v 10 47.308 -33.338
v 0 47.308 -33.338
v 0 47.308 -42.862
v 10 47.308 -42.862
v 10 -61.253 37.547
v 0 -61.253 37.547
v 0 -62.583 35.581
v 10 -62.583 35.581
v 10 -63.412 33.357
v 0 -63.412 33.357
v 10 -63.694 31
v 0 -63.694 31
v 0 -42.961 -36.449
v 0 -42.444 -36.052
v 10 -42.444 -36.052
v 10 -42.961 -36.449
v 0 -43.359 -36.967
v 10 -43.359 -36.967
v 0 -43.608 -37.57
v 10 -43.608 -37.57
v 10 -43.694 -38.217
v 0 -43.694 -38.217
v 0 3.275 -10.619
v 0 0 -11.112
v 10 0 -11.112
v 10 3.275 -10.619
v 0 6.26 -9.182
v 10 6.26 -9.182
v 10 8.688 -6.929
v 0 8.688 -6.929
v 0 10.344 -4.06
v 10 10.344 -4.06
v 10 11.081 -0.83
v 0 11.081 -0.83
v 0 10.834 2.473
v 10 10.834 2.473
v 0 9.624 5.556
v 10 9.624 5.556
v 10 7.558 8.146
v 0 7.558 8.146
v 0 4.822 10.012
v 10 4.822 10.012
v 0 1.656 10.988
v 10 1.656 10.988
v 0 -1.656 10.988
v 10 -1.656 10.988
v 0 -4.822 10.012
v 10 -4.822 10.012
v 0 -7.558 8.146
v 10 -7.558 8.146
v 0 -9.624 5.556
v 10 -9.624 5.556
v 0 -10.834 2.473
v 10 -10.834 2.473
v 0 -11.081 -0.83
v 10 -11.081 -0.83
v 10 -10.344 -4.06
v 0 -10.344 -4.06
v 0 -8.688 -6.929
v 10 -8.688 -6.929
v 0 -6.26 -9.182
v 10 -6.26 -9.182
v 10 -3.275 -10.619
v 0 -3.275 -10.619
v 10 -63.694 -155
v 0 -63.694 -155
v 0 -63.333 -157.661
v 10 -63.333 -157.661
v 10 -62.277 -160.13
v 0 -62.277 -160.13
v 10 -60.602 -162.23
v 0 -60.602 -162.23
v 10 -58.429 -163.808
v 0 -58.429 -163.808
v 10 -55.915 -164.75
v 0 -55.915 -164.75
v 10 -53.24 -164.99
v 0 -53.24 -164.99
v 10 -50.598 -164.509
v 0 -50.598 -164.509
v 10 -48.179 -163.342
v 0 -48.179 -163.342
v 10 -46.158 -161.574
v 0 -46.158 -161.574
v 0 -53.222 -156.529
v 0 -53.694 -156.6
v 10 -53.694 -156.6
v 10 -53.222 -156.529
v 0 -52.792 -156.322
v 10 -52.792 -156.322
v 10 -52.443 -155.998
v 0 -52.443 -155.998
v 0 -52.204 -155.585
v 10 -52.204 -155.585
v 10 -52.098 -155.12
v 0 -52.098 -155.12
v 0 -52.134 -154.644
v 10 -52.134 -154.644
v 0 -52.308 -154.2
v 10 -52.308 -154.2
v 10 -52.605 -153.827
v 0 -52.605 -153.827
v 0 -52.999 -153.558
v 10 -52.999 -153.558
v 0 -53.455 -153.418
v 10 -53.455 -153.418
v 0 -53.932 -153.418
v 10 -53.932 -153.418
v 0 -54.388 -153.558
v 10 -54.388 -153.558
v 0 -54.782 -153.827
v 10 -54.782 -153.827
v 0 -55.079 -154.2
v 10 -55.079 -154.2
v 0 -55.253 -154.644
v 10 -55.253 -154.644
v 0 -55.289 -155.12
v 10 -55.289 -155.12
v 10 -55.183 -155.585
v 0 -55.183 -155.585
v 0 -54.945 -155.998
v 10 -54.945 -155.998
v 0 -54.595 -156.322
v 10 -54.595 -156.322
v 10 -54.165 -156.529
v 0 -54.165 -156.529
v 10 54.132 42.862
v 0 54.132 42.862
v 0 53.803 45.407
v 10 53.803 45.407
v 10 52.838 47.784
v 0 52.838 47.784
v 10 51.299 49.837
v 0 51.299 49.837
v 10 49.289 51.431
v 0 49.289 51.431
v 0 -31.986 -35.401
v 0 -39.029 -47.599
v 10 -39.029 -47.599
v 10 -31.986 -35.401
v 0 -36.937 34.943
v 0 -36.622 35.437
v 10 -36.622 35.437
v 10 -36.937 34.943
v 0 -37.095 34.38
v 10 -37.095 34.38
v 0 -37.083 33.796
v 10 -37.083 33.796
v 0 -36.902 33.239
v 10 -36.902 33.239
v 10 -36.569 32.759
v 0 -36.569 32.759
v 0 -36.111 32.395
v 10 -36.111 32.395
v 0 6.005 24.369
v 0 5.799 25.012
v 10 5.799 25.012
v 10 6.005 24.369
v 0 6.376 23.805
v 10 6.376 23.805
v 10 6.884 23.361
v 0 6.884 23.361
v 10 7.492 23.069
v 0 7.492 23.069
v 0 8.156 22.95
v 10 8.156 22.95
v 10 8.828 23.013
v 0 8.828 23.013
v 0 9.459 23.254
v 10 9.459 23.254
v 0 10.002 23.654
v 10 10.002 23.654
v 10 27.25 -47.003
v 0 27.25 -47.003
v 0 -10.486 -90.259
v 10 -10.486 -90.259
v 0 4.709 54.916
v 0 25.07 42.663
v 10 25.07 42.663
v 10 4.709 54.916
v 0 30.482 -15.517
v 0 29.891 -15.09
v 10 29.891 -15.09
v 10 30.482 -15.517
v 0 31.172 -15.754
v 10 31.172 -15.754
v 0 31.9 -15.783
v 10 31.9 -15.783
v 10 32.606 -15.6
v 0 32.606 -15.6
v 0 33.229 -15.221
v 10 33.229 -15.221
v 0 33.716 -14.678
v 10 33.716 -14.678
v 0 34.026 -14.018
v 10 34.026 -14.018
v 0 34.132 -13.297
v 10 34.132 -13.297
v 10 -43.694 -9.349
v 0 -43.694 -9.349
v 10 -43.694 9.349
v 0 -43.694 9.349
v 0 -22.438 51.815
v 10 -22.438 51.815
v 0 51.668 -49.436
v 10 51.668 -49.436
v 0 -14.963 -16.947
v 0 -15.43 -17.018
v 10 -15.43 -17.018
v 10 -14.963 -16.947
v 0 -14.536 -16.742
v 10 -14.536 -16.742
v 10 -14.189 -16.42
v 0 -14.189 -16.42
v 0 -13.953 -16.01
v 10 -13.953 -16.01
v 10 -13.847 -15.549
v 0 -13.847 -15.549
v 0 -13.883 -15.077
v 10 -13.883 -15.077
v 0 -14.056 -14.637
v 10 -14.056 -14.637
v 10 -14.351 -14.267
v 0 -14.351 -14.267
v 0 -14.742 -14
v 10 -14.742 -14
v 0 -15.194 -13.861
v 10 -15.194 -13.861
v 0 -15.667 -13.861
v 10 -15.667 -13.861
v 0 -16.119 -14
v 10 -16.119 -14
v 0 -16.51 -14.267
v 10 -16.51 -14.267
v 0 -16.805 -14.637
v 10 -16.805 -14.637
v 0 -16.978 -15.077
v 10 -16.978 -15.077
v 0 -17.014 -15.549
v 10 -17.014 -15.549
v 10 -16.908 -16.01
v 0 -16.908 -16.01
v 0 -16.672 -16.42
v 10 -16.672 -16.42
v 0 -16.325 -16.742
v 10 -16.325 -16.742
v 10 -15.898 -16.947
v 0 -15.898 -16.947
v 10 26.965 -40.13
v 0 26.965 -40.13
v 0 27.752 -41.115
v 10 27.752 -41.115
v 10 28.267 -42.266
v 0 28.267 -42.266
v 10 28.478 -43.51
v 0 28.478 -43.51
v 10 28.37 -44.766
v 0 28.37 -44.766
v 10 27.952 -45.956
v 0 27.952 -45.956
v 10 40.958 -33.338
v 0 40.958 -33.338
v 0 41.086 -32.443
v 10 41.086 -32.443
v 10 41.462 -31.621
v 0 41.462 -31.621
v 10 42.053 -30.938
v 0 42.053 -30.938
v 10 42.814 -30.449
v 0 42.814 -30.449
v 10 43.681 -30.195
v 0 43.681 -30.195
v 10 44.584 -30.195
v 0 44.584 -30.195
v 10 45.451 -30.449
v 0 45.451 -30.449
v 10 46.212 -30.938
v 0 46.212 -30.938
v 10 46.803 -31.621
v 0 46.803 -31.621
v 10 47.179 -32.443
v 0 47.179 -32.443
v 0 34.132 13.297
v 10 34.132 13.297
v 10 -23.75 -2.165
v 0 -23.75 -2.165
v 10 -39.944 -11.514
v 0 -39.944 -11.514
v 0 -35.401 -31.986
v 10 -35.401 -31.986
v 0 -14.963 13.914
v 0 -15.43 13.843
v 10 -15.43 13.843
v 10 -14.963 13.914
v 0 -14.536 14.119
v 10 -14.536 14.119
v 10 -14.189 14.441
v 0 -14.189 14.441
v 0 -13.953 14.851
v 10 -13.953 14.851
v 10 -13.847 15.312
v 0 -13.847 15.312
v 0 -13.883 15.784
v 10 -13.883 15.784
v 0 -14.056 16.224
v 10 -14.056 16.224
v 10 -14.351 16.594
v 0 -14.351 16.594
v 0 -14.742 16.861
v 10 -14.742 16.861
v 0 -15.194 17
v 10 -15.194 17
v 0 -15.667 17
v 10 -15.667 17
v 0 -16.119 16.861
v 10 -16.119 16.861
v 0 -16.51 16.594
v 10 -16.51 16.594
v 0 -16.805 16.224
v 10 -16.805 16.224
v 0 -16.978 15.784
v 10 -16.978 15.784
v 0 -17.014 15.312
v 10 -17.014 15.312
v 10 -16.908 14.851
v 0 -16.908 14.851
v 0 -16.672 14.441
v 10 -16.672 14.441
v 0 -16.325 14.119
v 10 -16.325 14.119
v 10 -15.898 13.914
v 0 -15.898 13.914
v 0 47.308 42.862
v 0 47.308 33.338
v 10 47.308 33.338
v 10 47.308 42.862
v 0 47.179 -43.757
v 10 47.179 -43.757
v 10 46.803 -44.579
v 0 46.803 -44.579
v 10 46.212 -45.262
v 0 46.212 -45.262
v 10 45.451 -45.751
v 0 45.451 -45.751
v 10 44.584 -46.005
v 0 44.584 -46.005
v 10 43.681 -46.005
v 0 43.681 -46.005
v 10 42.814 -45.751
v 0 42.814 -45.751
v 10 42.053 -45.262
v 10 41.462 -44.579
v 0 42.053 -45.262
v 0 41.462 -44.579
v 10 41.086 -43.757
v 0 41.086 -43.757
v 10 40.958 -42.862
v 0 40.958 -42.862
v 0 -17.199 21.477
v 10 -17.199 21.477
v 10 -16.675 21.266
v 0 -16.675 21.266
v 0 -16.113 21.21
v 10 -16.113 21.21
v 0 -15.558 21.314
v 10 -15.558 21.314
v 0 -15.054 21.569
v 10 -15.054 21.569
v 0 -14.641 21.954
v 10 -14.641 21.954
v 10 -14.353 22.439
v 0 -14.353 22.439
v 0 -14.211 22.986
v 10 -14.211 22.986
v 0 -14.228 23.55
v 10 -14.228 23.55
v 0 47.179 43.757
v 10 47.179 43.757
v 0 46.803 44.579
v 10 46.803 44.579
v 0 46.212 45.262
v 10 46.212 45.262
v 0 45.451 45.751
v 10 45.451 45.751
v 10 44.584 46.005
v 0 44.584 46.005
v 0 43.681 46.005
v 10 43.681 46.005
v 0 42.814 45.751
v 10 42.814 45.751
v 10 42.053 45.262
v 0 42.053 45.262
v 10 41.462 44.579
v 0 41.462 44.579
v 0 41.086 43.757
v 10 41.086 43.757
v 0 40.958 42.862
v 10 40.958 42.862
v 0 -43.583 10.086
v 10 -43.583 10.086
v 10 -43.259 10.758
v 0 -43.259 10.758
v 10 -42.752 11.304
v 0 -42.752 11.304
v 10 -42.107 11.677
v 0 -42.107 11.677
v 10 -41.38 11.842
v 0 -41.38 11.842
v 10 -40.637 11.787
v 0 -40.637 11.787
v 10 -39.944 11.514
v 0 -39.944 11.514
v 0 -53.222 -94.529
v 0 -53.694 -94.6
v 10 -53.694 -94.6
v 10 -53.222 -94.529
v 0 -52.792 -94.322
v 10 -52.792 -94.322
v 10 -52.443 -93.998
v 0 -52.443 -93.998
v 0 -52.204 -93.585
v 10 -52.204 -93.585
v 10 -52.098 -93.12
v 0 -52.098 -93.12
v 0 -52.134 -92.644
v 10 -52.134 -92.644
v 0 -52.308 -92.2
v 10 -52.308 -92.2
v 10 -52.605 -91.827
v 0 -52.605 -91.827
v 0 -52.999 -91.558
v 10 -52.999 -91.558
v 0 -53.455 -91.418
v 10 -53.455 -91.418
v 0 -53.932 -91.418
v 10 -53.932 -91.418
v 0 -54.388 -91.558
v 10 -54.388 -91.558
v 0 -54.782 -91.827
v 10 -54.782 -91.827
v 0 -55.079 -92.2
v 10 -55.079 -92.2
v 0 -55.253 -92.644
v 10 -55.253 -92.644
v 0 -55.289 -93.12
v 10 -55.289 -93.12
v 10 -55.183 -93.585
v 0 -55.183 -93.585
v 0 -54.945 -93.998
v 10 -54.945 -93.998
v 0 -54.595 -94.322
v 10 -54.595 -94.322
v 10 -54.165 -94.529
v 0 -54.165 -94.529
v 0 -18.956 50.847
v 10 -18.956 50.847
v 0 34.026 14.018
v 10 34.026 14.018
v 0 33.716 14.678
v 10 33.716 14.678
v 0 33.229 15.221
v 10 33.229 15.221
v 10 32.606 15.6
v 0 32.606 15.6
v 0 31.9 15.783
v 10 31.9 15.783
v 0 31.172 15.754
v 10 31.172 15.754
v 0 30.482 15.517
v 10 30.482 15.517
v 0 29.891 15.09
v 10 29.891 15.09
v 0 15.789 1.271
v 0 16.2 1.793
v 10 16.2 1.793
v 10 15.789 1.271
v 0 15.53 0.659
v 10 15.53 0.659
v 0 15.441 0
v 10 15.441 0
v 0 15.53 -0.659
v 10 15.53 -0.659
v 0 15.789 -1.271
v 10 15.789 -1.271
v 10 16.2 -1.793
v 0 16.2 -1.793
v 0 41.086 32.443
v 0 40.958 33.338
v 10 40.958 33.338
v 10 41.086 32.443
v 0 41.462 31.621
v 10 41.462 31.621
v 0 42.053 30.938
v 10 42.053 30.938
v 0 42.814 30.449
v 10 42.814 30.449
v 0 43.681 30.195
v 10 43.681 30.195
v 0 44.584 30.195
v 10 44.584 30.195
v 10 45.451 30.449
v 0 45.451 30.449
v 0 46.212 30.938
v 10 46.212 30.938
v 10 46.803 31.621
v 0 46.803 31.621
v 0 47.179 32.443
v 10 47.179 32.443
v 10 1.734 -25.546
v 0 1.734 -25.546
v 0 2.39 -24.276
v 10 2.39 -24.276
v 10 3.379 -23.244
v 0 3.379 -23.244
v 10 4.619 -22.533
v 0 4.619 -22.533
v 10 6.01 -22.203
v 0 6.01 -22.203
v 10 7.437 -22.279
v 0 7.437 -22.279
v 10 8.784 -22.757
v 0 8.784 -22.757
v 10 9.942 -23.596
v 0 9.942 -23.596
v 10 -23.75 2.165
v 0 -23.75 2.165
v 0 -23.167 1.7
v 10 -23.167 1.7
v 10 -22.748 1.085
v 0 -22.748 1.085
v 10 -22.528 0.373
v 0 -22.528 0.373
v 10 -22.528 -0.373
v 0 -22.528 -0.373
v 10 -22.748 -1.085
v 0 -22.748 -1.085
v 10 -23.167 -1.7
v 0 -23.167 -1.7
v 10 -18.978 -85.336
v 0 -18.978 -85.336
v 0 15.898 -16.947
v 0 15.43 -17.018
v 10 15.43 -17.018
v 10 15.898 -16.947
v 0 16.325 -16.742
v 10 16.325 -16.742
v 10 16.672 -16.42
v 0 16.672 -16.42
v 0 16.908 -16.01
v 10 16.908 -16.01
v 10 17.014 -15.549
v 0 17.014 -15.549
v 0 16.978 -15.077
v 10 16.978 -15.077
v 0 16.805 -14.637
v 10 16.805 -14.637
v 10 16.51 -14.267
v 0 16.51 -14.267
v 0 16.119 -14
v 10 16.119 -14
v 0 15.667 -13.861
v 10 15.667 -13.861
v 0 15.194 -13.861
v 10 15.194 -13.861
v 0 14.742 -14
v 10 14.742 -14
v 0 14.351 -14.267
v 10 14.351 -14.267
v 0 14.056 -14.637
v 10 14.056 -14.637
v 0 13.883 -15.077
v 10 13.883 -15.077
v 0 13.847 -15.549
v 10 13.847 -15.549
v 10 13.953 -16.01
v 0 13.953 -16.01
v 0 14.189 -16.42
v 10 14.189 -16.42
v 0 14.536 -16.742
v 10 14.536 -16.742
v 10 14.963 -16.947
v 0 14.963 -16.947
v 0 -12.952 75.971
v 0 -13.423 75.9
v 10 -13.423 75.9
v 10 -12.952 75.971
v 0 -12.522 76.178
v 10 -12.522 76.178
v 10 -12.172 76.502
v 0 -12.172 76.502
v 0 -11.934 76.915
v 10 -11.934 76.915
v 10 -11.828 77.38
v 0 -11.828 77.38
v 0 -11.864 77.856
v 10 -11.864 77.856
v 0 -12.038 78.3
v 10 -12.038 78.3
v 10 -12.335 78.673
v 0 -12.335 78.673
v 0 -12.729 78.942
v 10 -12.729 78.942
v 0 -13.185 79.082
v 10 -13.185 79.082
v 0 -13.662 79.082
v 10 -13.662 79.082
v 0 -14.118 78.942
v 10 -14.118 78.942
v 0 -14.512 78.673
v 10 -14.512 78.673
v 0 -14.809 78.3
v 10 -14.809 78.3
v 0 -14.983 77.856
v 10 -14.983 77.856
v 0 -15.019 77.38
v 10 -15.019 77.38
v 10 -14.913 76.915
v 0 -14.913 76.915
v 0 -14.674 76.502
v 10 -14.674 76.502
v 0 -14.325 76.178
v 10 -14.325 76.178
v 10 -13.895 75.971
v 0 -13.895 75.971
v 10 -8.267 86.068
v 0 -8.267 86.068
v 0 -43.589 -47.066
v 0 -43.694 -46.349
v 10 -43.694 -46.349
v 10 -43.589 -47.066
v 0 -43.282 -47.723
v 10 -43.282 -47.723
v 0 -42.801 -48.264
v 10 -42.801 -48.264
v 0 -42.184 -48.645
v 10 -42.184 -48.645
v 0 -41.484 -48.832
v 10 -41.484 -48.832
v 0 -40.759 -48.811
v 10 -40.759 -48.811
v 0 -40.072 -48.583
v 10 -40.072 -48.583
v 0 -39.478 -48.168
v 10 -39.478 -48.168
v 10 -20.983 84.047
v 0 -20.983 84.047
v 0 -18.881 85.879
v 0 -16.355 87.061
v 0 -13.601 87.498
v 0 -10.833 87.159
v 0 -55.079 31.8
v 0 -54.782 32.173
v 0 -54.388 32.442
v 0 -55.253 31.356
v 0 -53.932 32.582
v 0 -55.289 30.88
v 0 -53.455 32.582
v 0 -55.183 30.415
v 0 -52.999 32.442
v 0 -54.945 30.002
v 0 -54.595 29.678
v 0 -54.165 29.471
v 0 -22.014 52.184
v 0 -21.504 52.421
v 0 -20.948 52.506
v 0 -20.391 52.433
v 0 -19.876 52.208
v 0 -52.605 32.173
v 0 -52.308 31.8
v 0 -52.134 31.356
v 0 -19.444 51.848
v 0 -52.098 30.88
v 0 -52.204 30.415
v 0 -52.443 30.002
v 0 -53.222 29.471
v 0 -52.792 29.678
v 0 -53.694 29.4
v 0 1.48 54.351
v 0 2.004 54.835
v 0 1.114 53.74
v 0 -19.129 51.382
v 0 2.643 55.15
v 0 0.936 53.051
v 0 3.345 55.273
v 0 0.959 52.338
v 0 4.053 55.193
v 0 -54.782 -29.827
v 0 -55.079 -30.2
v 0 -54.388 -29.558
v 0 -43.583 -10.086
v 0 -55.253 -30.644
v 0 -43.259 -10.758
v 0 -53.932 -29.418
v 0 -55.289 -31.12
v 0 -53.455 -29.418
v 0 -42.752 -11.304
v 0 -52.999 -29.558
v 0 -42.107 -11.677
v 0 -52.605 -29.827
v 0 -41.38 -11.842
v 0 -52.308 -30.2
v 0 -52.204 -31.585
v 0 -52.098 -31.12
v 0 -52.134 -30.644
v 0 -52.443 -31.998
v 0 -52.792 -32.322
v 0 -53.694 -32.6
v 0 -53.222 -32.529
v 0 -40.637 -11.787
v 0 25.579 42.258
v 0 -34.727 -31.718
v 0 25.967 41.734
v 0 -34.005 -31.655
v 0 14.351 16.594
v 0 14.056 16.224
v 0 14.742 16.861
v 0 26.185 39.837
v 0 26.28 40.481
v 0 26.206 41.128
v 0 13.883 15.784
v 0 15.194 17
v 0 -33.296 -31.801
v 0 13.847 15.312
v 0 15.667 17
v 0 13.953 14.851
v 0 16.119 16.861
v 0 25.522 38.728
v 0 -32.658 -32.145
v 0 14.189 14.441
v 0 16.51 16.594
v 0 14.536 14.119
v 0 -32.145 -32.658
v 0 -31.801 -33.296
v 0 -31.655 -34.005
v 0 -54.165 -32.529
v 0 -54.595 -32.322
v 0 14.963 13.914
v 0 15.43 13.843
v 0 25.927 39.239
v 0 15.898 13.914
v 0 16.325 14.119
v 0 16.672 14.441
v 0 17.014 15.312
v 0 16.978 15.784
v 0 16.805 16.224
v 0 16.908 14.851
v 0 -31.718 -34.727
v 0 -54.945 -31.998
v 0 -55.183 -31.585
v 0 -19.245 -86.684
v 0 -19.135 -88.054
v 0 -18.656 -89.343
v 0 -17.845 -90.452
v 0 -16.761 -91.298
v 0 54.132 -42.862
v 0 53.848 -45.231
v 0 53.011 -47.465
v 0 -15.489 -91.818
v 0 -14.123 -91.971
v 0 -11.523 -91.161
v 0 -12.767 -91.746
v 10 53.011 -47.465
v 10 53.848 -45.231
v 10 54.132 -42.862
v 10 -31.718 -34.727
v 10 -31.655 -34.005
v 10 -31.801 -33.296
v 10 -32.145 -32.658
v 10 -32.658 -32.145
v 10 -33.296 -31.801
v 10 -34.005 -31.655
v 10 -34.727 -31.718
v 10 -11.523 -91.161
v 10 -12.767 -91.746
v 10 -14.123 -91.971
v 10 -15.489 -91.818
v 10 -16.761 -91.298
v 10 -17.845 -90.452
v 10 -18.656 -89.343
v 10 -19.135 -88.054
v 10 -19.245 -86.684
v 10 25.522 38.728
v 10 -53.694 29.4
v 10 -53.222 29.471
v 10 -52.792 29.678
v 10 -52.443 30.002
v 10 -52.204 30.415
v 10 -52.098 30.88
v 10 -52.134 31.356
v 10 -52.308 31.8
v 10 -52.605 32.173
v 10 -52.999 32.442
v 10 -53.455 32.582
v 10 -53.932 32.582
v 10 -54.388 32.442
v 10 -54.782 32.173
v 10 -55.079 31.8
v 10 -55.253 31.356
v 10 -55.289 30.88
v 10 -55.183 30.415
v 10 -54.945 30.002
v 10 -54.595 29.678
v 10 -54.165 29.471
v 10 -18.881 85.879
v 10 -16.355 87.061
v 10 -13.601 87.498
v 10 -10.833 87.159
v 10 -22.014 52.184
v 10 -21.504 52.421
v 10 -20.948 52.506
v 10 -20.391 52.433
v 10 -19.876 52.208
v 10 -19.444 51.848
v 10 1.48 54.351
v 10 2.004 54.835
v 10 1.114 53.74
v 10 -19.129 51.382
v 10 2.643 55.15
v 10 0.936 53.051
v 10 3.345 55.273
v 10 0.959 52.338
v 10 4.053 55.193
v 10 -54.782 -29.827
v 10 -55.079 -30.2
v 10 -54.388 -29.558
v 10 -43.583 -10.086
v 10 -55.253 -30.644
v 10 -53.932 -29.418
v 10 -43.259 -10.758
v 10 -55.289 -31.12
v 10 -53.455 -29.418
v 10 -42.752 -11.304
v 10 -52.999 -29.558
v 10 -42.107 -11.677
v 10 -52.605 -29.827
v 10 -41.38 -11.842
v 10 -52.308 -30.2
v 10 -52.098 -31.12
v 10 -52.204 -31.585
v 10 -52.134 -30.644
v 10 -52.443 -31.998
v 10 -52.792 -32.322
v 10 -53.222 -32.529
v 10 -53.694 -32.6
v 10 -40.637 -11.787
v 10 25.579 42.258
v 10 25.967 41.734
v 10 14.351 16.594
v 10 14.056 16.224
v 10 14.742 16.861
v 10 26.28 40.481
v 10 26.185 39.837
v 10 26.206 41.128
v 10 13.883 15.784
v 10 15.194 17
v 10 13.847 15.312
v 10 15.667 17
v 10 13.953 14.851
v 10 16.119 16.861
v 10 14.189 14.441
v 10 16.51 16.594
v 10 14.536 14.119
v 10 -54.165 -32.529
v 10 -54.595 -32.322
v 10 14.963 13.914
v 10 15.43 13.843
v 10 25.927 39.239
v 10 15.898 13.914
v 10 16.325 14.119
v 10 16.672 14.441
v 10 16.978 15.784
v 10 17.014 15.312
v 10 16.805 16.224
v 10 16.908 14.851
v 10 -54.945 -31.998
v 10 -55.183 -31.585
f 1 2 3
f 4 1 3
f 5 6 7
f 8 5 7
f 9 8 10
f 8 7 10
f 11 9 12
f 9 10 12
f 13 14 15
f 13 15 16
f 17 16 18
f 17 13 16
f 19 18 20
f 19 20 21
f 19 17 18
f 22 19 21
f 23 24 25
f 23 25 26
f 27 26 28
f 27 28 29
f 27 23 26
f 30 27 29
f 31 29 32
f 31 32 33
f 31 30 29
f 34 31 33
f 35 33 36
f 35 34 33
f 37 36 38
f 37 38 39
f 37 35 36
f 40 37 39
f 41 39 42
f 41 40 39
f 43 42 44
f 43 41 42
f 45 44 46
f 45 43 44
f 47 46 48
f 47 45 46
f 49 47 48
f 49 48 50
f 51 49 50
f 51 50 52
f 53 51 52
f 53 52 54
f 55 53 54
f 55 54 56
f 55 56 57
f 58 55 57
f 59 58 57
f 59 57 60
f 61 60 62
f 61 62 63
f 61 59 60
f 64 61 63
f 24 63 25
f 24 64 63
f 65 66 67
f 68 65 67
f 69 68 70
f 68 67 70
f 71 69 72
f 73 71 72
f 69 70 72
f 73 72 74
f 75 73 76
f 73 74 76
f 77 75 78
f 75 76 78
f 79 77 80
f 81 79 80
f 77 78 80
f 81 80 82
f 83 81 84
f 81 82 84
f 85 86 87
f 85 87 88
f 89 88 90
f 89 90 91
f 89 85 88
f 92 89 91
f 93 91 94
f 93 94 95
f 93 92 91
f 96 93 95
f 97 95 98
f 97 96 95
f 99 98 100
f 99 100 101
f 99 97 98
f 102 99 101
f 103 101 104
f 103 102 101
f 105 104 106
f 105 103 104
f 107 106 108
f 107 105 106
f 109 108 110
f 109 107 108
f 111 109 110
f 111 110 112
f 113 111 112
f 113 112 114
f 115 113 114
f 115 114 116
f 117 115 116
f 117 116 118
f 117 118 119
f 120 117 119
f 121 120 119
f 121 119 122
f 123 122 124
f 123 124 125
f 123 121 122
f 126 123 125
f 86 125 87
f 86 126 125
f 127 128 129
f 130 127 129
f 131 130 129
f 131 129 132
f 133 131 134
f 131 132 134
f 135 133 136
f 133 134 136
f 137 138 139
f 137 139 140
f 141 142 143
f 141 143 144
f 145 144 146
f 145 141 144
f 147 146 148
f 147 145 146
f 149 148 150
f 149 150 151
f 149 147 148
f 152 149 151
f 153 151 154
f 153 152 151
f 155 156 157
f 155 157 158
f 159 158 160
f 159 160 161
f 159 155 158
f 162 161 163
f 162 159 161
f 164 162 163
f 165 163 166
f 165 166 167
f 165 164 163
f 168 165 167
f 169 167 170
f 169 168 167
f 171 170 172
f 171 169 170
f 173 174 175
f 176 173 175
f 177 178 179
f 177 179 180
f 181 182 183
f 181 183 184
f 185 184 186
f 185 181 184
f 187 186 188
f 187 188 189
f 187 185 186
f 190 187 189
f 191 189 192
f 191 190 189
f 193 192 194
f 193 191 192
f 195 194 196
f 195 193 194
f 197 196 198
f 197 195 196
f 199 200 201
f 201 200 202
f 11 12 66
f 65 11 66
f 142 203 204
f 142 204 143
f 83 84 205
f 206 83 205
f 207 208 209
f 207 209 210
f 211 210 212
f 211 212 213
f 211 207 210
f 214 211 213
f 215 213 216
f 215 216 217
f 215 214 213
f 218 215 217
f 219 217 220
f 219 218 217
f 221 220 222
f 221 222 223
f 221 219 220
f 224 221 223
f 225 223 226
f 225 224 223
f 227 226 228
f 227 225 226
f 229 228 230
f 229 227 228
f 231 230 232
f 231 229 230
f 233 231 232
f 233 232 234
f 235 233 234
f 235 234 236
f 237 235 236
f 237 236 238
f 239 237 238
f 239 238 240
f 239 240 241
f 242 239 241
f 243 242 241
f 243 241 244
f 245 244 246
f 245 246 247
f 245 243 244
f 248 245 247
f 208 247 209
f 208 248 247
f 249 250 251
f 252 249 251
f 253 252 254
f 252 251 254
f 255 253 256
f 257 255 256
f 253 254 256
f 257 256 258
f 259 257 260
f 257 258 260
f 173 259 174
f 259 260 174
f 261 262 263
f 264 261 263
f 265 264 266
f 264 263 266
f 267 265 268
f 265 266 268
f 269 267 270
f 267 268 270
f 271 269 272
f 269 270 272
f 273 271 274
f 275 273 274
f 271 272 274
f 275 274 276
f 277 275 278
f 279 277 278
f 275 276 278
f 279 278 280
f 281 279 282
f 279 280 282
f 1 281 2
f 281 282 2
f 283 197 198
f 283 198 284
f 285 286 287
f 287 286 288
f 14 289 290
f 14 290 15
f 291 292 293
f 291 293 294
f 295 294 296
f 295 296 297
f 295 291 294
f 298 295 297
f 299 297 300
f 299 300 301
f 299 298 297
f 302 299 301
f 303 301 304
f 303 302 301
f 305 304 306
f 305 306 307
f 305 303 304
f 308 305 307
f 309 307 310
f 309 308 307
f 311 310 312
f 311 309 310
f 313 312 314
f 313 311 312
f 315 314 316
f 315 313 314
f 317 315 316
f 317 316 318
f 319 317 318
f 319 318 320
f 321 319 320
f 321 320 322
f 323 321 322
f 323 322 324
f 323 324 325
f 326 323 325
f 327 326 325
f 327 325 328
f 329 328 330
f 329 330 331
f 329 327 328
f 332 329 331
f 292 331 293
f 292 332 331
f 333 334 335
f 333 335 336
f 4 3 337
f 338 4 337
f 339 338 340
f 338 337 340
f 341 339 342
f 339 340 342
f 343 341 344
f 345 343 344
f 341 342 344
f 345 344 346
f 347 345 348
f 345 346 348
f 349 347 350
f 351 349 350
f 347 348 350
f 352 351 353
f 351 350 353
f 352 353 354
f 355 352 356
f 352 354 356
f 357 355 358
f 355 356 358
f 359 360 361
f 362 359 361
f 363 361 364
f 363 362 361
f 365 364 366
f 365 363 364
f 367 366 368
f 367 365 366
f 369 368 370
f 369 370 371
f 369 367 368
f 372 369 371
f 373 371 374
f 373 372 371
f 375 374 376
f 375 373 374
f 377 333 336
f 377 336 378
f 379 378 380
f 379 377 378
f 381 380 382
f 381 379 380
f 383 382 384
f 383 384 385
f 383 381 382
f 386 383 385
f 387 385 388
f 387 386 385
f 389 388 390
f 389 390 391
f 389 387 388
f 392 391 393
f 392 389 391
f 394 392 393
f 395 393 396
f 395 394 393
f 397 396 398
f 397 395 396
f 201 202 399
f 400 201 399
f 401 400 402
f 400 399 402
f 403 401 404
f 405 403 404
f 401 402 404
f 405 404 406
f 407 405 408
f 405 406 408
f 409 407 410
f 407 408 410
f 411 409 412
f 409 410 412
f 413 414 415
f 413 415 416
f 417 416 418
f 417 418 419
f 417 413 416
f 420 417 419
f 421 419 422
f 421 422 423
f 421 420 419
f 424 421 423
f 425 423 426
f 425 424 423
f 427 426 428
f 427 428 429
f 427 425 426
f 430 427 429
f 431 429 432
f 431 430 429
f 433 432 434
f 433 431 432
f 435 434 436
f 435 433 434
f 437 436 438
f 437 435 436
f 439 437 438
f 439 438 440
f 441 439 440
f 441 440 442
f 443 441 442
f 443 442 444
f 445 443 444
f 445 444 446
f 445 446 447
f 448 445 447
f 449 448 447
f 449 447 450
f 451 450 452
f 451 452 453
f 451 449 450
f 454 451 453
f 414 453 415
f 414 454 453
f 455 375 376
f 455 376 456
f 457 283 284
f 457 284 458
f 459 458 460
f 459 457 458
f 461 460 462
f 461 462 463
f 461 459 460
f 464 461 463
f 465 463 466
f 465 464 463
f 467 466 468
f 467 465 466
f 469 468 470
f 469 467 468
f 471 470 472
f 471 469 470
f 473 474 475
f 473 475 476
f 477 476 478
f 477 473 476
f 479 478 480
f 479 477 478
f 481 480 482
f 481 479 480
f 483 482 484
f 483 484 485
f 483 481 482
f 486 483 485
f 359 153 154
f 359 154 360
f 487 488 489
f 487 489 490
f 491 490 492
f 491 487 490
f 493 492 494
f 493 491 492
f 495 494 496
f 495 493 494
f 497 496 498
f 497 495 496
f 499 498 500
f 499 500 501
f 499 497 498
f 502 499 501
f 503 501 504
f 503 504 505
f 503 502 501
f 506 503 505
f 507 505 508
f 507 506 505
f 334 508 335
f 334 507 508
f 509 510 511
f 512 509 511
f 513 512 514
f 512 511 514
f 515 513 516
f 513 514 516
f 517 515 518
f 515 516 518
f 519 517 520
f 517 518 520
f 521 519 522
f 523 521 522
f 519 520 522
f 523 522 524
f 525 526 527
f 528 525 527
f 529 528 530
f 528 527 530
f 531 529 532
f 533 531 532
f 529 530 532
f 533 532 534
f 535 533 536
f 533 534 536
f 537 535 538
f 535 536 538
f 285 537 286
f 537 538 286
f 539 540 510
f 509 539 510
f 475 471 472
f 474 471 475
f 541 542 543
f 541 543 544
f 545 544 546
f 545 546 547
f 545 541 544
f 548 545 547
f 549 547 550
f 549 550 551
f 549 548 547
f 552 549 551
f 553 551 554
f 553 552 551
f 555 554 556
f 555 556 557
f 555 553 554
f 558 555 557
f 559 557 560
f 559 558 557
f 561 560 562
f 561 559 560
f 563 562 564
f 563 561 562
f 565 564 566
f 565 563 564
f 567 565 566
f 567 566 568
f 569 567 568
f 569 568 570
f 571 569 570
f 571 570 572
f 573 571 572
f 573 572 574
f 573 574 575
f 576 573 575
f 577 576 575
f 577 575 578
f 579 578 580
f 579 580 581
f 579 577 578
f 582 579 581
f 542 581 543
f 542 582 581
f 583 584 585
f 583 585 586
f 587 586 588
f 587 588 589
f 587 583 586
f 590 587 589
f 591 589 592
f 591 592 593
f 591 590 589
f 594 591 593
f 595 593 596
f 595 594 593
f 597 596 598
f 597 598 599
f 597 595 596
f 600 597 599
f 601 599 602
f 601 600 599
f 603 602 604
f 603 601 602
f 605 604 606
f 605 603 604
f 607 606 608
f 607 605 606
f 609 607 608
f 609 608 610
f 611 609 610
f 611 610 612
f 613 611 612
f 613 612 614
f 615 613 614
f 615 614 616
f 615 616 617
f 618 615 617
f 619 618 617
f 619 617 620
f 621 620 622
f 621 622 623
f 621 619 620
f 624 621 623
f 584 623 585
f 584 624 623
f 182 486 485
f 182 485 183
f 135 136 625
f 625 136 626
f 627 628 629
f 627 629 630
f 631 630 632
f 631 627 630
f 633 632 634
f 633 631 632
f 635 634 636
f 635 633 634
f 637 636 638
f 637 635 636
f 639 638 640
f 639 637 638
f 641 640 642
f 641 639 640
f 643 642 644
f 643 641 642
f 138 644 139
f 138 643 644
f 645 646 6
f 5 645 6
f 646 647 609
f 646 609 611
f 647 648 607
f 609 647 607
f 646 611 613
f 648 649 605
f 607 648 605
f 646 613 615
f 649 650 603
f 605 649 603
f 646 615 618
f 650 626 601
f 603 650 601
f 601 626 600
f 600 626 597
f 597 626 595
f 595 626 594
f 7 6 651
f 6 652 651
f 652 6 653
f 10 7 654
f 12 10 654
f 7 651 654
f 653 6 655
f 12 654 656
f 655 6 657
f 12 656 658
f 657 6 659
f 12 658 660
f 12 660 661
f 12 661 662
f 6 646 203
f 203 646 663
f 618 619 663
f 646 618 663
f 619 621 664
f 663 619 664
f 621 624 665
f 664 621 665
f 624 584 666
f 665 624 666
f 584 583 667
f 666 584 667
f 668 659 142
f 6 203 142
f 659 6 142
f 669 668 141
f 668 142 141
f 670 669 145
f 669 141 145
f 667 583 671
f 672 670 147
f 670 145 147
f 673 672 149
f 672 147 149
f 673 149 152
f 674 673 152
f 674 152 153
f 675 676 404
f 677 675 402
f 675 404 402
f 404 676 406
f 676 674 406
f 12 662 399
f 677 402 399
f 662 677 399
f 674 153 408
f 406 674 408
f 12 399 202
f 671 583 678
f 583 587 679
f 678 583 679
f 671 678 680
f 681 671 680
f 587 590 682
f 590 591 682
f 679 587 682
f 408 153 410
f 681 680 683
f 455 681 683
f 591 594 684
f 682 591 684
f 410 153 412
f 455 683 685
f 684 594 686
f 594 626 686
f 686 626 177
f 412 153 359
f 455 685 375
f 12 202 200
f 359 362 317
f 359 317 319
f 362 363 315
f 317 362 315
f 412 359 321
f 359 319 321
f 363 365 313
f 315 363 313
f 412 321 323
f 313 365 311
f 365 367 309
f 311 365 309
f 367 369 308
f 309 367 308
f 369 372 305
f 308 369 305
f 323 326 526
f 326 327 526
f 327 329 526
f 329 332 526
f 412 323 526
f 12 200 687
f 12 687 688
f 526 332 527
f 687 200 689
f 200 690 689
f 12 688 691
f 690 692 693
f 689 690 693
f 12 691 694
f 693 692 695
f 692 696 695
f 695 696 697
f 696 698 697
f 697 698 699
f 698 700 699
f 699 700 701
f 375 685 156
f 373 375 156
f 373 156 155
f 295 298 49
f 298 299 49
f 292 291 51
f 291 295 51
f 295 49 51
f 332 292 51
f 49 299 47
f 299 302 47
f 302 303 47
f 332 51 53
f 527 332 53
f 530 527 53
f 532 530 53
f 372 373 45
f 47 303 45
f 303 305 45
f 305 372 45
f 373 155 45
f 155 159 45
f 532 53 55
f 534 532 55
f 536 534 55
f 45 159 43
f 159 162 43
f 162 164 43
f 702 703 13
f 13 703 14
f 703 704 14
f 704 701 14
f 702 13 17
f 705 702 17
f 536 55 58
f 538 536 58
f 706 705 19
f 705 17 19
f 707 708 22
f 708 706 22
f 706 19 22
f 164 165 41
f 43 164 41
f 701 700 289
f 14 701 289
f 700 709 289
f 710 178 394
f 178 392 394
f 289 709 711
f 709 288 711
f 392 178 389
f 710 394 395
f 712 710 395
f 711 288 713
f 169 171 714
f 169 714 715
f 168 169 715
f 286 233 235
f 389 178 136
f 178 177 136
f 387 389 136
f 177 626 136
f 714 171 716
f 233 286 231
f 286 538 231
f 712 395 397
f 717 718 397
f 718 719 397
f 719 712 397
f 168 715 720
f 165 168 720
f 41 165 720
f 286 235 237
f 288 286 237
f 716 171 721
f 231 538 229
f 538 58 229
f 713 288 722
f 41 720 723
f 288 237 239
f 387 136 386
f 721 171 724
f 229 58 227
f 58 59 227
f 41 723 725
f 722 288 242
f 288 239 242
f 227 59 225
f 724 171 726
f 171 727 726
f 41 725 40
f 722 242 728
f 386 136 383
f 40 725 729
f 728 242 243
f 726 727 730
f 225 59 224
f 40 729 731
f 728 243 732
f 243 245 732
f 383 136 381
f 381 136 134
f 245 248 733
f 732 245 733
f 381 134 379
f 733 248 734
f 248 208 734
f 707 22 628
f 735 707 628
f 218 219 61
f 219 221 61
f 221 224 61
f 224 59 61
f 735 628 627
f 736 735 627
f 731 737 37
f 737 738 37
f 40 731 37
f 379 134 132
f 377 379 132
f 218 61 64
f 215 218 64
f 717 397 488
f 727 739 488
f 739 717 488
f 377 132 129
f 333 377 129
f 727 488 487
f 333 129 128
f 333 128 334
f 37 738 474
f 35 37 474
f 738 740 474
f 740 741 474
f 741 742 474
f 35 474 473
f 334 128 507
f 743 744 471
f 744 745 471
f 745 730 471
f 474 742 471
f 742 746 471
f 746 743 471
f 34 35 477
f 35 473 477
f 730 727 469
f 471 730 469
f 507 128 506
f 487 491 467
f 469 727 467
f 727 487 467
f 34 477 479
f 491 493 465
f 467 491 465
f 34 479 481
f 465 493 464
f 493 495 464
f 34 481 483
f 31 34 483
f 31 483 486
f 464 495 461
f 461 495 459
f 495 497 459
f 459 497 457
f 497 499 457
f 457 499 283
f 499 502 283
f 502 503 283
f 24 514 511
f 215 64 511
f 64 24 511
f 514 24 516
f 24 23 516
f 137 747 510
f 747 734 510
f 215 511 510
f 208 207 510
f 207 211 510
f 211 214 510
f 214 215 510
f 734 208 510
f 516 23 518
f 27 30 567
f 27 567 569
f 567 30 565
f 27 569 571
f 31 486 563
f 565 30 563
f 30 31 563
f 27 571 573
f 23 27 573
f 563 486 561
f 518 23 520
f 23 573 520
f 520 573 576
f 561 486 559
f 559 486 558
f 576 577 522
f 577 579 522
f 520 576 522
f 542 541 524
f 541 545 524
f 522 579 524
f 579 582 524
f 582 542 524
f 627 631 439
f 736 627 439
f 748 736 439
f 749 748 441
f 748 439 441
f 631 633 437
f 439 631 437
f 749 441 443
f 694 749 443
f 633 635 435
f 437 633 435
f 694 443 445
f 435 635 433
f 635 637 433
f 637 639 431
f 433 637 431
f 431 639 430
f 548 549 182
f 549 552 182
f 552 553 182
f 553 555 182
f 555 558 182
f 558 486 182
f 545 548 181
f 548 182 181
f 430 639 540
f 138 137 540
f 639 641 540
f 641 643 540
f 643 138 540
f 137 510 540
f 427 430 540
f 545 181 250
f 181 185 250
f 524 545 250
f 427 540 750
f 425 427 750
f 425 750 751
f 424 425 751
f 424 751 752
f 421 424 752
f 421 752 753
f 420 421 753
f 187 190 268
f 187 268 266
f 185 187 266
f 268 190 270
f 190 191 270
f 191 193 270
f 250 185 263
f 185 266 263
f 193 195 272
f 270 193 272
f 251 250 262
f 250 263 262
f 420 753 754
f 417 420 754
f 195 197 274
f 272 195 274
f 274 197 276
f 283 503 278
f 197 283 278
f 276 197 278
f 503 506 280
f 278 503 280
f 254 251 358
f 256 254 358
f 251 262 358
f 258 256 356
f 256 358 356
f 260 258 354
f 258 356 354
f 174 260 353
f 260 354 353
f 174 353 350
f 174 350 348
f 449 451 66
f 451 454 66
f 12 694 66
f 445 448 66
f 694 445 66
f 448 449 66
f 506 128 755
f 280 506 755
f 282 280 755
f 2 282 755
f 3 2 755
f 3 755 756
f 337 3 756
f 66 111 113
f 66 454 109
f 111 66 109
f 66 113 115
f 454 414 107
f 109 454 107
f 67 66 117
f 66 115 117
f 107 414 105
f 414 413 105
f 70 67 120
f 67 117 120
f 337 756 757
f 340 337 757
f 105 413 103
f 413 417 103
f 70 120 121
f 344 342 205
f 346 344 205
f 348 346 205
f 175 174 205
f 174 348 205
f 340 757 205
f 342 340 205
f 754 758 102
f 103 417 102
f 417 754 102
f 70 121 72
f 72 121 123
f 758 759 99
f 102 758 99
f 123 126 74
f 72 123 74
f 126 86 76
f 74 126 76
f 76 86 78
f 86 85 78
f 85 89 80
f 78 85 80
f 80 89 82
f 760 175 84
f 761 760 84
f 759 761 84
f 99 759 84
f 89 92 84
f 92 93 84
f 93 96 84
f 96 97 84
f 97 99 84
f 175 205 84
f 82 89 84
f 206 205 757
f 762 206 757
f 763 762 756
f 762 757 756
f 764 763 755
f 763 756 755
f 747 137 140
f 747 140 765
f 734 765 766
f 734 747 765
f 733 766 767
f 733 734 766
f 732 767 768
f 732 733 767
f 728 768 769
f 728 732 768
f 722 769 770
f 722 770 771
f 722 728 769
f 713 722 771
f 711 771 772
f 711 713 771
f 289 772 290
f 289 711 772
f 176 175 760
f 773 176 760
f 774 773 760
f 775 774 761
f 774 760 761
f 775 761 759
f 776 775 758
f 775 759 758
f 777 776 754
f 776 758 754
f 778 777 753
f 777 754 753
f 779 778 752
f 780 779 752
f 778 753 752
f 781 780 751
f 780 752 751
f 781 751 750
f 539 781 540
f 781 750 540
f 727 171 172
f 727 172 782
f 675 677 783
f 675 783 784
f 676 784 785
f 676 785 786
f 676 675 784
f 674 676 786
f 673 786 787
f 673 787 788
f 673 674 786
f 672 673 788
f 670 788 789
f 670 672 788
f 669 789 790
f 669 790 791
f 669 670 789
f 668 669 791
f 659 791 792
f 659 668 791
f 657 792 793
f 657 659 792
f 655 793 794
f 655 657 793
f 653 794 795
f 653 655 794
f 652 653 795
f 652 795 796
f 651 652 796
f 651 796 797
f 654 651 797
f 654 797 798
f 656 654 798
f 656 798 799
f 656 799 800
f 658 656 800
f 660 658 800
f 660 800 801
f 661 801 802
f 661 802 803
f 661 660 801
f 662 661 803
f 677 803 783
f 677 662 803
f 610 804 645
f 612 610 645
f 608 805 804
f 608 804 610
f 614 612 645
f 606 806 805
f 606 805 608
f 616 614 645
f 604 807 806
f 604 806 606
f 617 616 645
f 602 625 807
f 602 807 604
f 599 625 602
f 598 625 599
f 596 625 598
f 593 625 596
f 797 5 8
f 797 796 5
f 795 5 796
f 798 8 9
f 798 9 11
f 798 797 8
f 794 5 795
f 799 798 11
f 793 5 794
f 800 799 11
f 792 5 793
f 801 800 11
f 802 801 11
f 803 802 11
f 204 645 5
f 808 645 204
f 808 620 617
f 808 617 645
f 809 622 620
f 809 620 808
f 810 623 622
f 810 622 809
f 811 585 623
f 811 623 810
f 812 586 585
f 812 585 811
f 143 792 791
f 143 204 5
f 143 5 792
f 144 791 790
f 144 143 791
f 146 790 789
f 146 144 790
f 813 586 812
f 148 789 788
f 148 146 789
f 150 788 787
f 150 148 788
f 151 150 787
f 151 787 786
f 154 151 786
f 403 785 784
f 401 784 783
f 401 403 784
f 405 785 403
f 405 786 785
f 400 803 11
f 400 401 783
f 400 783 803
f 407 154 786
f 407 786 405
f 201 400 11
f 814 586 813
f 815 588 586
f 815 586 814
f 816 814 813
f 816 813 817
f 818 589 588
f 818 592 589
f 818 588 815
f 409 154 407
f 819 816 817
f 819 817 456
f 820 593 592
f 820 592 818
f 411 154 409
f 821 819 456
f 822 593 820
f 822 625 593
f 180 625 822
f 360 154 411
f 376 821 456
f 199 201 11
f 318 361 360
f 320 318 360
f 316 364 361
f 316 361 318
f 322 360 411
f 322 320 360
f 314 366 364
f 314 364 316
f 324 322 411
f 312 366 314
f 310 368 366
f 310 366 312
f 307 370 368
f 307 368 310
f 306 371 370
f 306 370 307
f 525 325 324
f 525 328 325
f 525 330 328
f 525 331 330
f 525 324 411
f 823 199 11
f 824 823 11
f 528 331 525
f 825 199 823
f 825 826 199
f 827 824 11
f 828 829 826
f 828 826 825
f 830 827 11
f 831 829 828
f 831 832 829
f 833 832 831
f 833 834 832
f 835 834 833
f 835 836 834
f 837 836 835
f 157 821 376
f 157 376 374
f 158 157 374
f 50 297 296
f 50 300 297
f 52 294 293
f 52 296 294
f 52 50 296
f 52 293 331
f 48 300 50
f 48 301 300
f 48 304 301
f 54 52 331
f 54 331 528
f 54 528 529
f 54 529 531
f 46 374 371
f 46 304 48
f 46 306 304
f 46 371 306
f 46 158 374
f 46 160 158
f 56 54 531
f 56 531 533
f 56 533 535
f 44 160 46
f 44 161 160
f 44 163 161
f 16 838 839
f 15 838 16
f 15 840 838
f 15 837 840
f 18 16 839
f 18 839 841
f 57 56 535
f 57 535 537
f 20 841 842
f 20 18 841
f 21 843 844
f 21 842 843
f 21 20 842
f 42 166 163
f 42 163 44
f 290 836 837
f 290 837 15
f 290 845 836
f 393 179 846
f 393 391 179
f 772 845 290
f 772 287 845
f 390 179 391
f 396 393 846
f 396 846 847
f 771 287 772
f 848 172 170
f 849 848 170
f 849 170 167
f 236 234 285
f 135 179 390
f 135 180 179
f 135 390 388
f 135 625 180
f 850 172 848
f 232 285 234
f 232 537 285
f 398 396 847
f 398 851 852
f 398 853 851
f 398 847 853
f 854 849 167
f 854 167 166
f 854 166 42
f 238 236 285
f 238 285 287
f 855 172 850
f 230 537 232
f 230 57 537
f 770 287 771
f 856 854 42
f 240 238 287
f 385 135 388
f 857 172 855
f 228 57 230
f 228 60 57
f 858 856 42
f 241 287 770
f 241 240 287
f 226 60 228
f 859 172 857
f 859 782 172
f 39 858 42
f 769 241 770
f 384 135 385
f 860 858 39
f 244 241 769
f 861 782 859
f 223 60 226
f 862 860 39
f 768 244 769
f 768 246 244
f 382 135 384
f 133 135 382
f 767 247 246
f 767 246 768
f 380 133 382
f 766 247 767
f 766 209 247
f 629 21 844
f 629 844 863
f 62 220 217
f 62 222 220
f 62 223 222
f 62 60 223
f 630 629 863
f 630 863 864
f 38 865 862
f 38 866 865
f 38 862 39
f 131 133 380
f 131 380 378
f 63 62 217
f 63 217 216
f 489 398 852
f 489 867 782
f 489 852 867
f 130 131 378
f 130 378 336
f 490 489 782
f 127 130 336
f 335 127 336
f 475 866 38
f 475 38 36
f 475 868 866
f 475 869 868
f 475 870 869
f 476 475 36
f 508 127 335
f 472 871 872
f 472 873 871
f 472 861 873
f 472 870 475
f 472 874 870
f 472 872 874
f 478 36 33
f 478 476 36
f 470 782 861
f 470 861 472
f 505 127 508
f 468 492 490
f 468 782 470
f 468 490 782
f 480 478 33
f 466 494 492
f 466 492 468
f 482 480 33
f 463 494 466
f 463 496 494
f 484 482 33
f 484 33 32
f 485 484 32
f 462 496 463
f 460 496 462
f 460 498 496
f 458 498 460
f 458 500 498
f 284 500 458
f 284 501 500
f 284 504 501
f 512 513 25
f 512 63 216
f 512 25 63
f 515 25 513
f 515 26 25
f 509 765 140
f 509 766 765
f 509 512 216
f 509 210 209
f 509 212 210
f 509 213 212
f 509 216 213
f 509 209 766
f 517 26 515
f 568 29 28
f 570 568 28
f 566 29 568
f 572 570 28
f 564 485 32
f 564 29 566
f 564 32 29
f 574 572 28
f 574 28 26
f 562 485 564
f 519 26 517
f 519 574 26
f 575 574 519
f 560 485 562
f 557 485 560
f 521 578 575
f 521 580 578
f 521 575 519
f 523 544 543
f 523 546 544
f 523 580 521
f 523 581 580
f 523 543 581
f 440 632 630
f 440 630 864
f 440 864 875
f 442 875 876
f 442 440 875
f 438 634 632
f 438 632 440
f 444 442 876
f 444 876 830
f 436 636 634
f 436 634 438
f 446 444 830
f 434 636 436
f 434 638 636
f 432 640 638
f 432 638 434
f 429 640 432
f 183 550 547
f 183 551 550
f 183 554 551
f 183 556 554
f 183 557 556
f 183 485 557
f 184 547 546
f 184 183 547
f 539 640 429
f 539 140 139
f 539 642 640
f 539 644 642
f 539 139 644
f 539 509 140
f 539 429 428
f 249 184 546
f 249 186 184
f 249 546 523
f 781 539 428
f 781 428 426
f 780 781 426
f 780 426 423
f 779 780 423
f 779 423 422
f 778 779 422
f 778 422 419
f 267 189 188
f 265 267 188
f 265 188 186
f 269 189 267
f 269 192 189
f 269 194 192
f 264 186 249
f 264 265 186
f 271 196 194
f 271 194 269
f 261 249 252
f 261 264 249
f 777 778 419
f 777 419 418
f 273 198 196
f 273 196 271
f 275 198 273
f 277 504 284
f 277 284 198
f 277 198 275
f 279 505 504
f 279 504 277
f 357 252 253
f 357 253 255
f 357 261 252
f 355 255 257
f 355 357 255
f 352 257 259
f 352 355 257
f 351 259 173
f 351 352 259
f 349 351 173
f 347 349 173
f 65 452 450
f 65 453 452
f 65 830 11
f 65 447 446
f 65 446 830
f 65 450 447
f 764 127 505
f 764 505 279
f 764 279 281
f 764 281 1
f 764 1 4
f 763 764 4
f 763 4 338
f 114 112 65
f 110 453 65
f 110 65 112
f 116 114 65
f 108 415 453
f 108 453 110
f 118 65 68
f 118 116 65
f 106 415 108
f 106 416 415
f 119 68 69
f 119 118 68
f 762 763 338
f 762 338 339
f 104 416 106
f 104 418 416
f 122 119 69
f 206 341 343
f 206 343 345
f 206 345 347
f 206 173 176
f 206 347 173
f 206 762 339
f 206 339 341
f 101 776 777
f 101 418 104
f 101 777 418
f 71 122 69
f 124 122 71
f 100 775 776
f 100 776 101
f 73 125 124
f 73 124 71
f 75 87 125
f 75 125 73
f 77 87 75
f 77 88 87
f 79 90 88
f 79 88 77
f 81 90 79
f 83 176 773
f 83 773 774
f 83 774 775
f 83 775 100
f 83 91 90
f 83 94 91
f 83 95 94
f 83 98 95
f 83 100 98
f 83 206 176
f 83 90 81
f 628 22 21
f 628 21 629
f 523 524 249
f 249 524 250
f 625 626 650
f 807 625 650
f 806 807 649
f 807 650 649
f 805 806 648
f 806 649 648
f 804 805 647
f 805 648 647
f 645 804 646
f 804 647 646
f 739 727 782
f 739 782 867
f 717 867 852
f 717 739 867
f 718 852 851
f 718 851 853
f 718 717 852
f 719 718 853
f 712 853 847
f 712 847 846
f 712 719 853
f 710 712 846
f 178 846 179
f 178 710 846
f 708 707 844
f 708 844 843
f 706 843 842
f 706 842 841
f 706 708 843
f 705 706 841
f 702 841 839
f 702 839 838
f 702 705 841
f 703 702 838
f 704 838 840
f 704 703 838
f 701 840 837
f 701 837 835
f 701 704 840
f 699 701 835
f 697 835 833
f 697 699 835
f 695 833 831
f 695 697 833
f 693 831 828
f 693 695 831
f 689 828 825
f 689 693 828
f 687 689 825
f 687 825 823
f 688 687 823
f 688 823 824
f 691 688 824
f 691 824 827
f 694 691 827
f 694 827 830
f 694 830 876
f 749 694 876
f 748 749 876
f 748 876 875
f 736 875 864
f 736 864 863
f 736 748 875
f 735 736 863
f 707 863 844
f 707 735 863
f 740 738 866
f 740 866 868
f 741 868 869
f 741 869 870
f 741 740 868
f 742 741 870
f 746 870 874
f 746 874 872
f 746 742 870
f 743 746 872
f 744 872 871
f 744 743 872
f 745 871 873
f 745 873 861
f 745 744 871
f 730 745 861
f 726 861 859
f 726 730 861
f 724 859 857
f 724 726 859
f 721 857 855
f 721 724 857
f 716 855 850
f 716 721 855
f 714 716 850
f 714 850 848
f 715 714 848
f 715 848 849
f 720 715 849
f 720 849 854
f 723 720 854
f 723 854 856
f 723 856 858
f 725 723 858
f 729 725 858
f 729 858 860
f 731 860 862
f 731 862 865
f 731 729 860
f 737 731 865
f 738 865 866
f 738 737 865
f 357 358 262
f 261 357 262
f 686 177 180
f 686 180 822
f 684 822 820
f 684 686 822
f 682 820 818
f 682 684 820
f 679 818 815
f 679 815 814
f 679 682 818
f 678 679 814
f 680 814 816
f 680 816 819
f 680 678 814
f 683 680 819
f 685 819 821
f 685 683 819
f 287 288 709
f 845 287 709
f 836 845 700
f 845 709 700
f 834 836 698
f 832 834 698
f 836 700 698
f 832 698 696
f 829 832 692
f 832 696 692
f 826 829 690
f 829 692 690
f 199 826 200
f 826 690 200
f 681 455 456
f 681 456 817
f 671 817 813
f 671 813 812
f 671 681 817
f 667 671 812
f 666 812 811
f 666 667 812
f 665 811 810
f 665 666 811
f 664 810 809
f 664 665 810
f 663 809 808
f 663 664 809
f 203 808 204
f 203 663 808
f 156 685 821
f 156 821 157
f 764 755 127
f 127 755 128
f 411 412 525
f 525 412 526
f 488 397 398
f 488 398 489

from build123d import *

# Parameters (mm, degrees)
SKETCH1_R           = 11.1125
SKETCH1_R_2         = 1.5875
SKETCH1_R_3         = 1.6
BOSS_EXTRUDE1_DEPTH = 10


with BuildPart() as part:
    # Sketch1 → Boss-Extrude1 (new body)
    with BuildSketch(Plane(origin=(0, 0, 0), x_dir=(0, 0, -1), z_dir=(1, 0, 0))):
        with BuildLine():
            Line((-31, -63.693575035), (155, -63.693575035))
            ThreePointArc((155, -63.693575035), (164.363641759, -57.203876021), (161.573840181, -46.158017638))
            Line((161.573840181, -46.158017638), (49.436340181, 51.668057396))
            ThreePointArc((49.436340181, 51.668057396), (46.372800987, 53.496141759), (42.8625, 54.1325))
            Line((42.8625, 54.1325), (-42.8625, 54.1325))
            ThreePointArc((-42.8625, 54.1325), (-47.78371281, 52.83776648), (-51.430593782, 49.288832897))
            Line((-51.430593782, 49.288832897), (-86.068093782, -8.267060862))
            ThreePointArc((-86.068093782, -8.267060862), (-87.375969658, -14.993496721), (-84.046536707, -20.982683219))
            Line((-84.046536707, -20.982683219), (-37.546536707, -61.252864495))
            ThreePointArc((-37.546536707, -61.252864495), (-34.49335837, -63.063550878), (-31, -63.693575035))
        make_face()
        Circle(SKETCH1_R, mode=Mode.SUBTRACT)
        with Locations((-15.4305, 15.4305)):
            Circle(SKETCH1_R_2, mode=Mode.SUBTRACT)
        with Locations((15.4305, 15.4305)):
            Circle(SKETCH1_R_2, mode=Mode.SUBTRACT)
        with Locations((15.4305, -15.4305)):
            Circle(SKETCH1_R_2, mode=Mode.SUBTRACT)
        with Locations((-15.4305, -15.4305)):
            Circle(SKETCH1_R_2, mode=Mode.SUBTRACT)
        with Locations((-77.5, -13.423393759)):
            Circle(SKETCH1_R_3, mode=Mode.SUBTRACT)
        with Locations((-31, -53.693575035)):
            Circle(SKETCH1_R_3, mode=Mode.SUBTRACT)
        with Locations((31, -53.693575035)):
            Circle(SKETCH1_R_3, mode=Mode.SUBTRACT)
        with Locations((93, -53.693575035)):
            Circle(SKETCH1_R_3, mode=Mode.SUBTRACT)
        with Locations((155, -53.693575035)):
            Circle(SKETCH1_R_3, mode=Mode.SUBTRACT)
        with BuildLine():
            Line((33.3375, 47.3075), (42.8625, 47.3075))
            ThreePointArc((42.8625, 47.3075), (46.0375, 44.1325), (42.8625, 40.9575))
            Line((42.8625, 40.9575), (33.3375, 40.9575))
            ThreePointArc((33.3375, 40.9575), (30.1625, 44.1325), (33.3375, 47.3075))
        make_face(mode=Mode.SUBTRACT)
        with BuildLine():
            Line((-33.3375, 47.3075), (-42.8625, 47.3075))
            ThreePointArc((-42.8625, 47.3075), (-46.0375, 44.1325), (-42.8625, 40.9575))
            Line((-42.8625, 40.9575), (-33.3375, 40.9575))
            ThreePointArc((-33.3375, 40.9575), (-30.1625, 44.1325), (-33.3375, 47.3075))
        make_face(mode=Mode.SUBTRACT)
        with BuildLine():
            Line((13.297041151, 34.1325), (-13.297041151, 34.1325))
            ThreePointArc((-13.297041151, 34.1325), (-15.599695746, 32.606040867), (-15.090423831, 29.890725455))
            Line((-15.090423831, 29.890725455), (-1.793382679, 16.1996979))
            ThreePointArc((-1.793382679, 16.1996979), (0, 15.441472444), (1.793382679, 16.1996979))
            Line((1.793382679, 16.1996979), (15.090423831, 29.890725455))
            ThreePointArc((15.090423831, 29.890725455), (15.599695746, 32.606040867), (13.297041151, 34.1325))
        make_face(mode=Mode.SUBTRACT)
        with BuildLine():
            Line((-51.815124471, -22.438391905), (-35.436810722, -36.622427682))
            ThreePointArc((-35.436810722, -36.622427682), (-33.795573215, -37.08283305), (-32.395452573, -36.11056979))
            Line((-32.395452573, -36.11056979), (-21.47657674, -17.198522087))
            ThreePointArc((-21.47657674, -17.198522087), (-21.568587763, -15.053852045), (-23.549955622, -14.22786353))
            Line((-23.549955622, -14.22786353), (-50.847145204, -18.955875456))
            ThreePointArc((-50.847145204, -18.955875456), (-52.43276537, -20.390931102), (-51.815124471, -22.438391905))
        make_face(mode=Mode.SUBTRACT)
        with BuildLine():
            Line((-42.663433079, 25.069654772), (-54.916393111, 4.709349732))
            ThreePointArc((-54.916393111, 4.709349732), (-54.834634818, 2.004177703), (-52.338364397, 0.958580214))
            Line((-52.338364397, 0.958580214), (-25.011725561, 5.798578931))
            ThreePointArc((-25.011725561, 5.798578931), (-23.068694594, 7.492029199), (-23.65434815, 10.002039769))
            Line((-23.65434815, 10.002039769), (-38.728026954, 25.522346093))
            ThreePointArc((-38.728026954, 25.522346093), (-40.807101694, 26.264193912), (-42.663433079, 25.069654772))
        make_face(mode=Mode.SUBTRACT)
        with BuildLine():
            Line((-11.514428415, -39.943575035), (-2.165063509, -23.75))
            ThreePointArc((-2.165063509, -23.75), (0, -22.5), (2.165063509, -23.75))
            Line((2.165063509, -23.75), (11.514428415, -39.943575035))
            ThreePointArc((11.514428415, -39.943575035), (11.514428415, -42.443575035), (9.349364905, -43.693575035))
            Line((9.349364905, -43.693575035), (-9.349364905, -43.693575035))
            ThreePointArc((-9.349364905, -43.693575035), (-11.514428415, -42.443575035), (-11.514428415, -39.943575035))
        make_face(mode=Mode.SUBTRACT)
        with BuildLine():
            Line((38.216878365, -43.693575035), (46.349364905, -43.693575035))
            ThreePointArc((46.349364905, -43.693575035), (48.764179471, -41.840622647), (47.599364905, -39.028511525))
            Line((47.599364905, -39.028511525), (35.400635095, -31.985571585))
            ThreePointArc((35.400635095, -31.985571585), (32.382868142, -32.382868142), (31.985571585, -35.400635095))
            Line((31.985571585, -35.400635095), (36.051814855, -42.443575035))
            ThreePointArc((36.051814855, -42.443575035), (36.966878365, -43.358638544), (38.216878365, -43.693575035))
        make_face(mode=Mode.SUBTRACT)
        with BuildLine():
            Line((47.00332879, 27.249721463), (90.259443654, -10.48587937))
            ThreePointArc((90.259443654, -10.48587937), (91.29812152, -16.761486275), (85.335889386, -18.978213981))
            Line((85.335889386, -18.978213981), (25.545919003, 1.733639317))
            ThreePointArc((25.545919003, 1.733639317), (22.317964542, 5.302436868), (23.59578782, 9.941744319))
            Line((23.59578782, 9.941744319), (40.12964334, 26.965491854))
            ThreePointArc((40.12964334, 26.965491854), (43.509833256, 28.4776736), (47.00332879, 27.249721463))
        make_face(mode=Mode.SUBTRACT)
    extrude(amount=BOSS_EXTRUDE1_DEPTH)


solid = part.part
